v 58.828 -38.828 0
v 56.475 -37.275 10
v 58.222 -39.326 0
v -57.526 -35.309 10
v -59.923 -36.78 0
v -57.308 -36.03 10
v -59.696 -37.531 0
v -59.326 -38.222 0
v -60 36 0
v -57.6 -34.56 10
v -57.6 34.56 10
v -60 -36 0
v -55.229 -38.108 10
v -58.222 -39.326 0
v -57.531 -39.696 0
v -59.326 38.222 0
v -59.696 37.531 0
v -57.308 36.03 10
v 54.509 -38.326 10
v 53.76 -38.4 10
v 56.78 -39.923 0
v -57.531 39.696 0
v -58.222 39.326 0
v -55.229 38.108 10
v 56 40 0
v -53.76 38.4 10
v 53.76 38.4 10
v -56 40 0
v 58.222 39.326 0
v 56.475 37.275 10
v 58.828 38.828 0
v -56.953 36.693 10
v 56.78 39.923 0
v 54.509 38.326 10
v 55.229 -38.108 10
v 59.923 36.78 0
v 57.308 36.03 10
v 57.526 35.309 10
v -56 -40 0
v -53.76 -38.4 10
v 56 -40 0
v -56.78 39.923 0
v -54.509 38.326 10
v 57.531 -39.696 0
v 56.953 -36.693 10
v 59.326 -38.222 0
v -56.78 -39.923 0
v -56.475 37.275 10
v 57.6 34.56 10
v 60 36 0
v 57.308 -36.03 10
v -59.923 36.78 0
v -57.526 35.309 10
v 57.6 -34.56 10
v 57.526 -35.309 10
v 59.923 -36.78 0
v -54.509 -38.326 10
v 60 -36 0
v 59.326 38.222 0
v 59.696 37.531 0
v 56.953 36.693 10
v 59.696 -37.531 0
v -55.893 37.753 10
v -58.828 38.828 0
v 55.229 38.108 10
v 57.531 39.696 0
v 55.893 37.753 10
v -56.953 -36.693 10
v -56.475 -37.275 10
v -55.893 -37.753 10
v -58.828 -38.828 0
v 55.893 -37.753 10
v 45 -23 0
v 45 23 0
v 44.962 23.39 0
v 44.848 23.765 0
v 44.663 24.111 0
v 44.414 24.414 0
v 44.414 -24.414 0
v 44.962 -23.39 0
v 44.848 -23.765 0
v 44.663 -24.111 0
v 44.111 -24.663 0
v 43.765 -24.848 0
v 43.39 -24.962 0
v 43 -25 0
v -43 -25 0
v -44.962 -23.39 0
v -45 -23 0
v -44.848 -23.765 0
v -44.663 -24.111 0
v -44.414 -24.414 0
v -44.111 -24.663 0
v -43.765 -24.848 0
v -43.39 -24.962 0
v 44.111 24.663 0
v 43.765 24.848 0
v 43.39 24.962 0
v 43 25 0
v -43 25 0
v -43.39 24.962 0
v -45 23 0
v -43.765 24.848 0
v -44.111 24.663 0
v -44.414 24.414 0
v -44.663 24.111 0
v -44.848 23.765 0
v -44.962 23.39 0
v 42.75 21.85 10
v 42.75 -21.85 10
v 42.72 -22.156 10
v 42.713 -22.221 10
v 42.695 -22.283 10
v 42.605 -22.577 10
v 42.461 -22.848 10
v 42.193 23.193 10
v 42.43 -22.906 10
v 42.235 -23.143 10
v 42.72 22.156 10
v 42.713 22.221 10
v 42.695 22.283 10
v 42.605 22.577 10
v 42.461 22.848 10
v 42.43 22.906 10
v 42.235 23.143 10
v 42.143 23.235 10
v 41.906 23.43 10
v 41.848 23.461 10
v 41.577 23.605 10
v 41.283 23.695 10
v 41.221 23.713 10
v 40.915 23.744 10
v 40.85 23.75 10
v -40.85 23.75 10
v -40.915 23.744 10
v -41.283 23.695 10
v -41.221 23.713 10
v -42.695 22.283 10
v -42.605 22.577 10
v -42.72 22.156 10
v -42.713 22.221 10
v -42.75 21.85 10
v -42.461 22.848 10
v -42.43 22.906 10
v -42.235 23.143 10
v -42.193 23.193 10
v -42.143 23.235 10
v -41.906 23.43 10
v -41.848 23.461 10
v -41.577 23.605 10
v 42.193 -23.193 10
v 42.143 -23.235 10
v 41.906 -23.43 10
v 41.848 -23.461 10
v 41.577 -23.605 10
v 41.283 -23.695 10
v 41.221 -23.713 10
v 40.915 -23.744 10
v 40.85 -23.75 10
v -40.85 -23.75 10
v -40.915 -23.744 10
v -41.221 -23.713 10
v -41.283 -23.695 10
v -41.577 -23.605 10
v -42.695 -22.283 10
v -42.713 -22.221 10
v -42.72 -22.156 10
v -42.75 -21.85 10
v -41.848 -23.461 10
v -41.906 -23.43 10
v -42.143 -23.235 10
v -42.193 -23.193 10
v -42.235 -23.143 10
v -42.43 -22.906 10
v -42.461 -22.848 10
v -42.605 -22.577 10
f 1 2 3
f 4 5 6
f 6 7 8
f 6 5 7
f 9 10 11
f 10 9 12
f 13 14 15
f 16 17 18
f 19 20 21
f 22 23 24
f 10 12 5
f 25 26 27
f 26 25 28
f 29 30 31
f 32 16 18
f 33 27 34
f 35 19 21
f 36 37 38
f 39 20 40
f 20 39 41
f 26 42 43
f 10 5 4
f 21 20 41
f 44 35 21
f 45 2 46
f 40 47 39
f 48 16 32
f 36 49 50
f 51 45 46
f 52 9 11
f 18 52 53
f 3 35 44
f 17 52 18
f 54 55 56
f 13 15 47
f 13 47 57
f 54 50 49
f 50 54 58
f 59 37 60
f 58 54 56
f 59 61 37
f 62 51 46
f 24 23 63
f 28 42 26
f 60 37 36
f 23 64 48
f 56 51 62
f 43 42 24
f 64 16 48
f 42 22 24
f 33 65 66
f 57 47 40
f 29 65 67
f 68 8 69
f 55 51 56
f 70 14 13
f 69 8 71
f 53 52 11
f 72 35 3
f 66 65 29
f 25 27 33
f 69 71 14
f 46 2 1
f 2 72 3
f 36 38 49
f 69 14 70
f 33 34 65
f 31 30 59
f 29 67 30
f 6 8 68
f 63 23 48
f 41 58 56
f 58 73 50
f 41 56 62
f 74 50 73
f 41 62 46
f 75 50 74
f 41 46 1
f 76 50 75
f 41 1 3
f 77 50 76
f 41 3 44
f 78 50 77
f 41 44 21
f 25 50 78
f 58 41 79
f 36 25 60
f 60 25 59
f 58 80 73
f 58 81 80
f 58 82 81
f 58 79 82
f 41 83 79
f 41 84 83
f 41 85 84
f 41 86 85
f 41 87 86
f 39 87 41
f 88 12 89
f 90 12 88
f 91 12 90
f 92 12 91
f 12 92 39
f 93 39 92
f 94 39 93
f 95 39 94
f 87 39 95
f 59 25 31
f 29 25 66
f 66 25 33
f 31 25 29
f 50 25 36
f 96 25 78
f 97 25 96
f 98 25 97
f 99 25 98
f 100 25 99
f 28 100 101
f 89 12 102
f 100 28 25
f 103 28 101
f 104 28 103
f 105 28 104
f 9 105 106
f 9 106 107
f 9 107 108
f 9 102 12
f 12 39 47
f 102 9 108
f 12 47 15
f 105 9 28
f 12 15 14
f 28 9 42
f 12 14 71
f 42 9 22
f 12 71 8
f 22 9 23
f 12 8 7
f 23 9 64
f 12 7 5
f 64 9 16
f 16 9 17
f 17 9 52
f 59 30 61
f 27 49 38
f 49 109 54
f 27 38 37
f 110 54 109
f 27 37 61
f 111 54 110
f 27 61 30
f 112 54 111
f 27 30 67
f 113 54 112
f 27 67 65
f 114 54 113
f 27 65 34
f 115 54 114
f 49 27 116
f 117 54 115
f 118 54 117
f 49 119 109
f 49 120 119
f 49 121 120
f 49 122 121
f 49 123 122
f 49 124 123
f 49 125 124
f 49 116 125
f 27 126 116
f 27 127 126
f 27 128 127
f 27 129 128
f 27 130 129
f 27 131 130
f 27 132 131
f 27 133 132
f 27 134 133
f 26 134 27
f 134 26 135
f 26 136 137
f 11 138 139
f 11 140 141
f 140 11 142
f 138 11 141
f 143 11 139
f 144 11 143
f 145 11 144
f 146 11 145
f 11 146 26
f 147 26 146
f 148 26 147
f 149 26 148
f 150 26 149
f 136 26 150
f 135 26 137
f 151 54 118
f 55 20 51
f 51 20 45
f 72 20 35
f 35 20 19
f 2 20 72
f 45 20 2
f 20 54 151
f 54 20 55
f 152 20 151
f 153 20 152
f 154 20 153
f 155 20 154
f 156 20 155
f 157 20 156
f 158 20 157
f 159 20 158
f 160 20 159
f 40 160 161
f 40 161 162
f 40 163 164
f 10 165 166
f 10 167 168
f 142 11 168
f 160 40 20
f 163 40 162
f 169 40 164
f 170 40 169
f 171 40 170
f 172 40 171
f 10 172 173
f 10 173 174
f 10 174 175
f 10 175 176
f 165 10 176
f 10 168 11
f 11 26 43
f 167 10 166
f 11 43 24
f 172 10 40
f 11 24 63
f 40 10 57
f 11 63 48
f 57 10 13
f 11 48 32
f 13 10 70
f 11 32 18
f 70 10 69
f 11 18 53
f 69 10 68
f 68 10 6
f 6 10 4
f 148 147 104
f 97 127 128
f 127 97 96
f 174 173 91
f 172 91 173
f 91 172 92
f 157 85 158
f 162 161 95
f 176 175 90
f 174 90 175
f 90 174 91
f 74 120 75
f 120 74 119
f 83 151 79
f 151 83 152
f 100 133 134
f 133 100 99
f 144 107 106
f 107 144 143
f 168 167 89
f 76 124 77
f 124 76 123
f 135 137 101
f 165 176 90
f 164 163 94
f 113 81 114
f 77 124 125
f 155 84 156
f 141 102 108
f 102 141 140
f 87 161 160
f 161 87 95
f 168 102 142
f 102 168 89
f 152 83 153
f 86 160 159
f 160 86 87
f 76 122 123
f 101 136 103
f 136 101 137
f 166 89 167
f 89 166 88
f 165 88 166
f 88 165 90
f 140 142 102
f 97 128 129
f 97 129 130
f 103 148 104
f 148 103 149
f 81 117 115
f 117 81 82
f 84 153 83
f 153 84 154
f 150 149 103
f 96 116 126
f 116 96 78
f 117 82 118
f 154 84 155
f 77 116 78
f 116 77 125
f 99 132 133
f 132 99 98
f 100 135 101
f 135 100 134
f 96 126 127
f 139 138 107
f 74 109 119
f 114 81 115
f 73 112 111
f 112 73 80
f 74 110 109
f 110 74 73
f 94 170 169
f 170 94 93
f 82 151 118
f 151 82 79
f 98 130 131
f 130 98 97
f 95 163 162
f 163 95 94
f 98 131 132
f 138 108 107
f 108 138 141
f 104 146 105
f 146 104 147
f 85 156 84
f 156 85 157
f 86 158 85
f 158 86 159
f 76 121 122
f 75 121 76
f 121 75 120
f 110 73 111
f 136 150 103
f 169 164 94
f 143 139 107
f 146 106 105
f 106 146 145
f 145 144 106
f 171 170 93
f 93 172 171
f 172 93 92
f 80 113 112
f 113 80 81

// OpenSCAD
$fn = 32;

// ----------------------------------------------------------------------
// Display bezel: 120 x 80 mm frame, opening 90x50 mm
// ----------------------------------------------------------------------

// --- parameters (mm) ---
length = 120;             // frame outside length, X
width = 80;               // frame outside width, Y
frame_w = 15;             // frame width
thickness = 10;           // frame thickness
corner_r = 4;             // outside corner radius
chamfer = 0.96;           // outer wall taper
funnel = 0.94;            // inner opening taper
opening_l = 90;           // opening length
opening_w = 50;           // opening width
inner_r = 2;              // opening corner radius

/* rounded-rectangle outlines, generated with loops */
module rounded_ring(l_nom, w_nom, r) {
  hull() {
    for (sx = [-1, 1]) for (sy = [-1, 1])
      translate([sx * (l_nom / 2 - r), sy * (w_nom / 2 - r)]) circle(r = r);
  }
}

difference() {
  /* frame body, drafted so the outer edge is a variable-depth chamfer */
  linear_extrude(height = thickness, scale = chamfer)
    rounded_ring(length, width, corner_r);
  /* viewing opening, drafted the other way for a funnel edge */
  linear_extrude(height = thickness + 2, scale = funnel)
    translate([0, 0, -1]) rounded_ring(opening_l, opening_w, inner_r);
}
